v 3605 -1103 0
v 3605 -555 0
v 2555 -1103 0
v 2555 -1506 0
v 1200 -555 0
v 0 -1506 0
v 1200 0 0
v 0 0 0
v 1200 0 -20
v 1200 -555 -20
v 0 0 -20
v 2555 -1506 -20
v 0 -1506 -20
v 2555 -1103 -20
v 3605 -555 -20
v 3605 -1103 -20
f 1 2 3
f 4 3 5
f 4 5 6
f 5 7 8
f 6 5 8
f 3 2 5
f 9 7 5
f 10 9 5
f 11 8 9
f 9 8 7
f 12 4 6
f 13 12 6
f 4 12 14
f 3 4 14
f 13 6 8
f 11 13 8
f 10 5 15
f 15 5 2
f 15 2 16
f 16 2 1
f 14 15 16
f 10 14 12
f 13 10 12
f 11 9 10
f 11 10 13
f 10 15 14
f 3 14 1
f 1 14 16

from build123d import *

# Parameters (mm, degrees)
TABAN_FLAN_1_DEPTH         = 20
KES_EKSTR_ZYON1_DEPTH      = 6196.848287361
KES_EKSTR_ZYON1_DEPTH_BACK = 6196.848287361
IZIM2_W                    = 3455
IZIM2_H                    = 403


# Sheet-metal steps are written as plain solids
with BuildPart() as part:
    # Çizim1 → Taban-Flanş1 (new body)
    with BuildSketch(Plane.XY):
        Polygon((0, 0), (1200, 0), (1200, -555), (3605, -555), (3605, -1103), (6010, -1103), (6010, -1506), (0, -1506), align=None)
    extrude(amount=-TABAN_FLAN_1_DEPTH)

    # Çizim2 → Kes-Ekstrüzyon1 (cut, two sides: drawn at the far end of the back side and taken through both)
    with BuildSketch(Plane.XY.offset(-KES_EKSTR_ZYON1_DEPTH_BACK)):
        with Locations((4282.5, -1304.5)):
            Rectangle(IZIM2_W, IZIM2_H)
    extrude(amount=KES_EKSTR_ZYON1_DEPTH + KES_EKSTR_ZYON1_DEPTH_BACK, mode=Mode.SUBTRACT)


solid = part.part
